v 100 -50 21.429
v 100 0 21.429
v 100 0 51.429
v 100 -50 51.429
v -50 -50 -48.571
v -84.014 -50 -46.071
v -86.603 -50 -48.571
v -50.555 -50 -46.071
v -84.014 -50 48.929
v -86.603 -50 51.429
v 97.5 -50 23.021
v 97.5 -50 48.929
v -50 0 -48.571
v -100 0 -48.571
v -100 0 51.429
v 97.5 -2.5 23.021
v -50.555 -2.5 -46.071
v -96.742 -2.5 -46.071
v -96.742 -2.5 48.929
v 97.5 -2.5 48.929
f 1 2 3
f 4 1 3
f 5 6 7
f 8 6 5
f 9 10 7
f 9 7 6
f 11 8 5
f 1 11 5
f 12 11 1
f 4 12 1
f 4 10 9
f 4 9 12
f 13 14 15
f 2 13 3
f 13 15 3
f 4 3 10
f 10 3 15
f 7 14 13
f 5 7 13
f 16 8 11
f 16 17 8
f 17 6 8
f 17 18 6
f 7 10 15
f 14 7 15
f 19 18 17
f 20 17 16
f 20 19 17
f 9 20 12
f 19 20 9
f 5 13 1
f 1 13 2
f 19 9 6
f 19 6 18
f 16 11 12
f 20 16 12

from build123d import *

# Parameters (mm, degrees)
F1_DEPTH = 50
F3_DEPTH = 100.001
F4_T     = -2.5


with BuildPart() as f1:
    # F0 (on Front) → F1 (new body)
    with BuildSketch(Plane.XZ):
        Polygon((100, 51.4285714286), (-100, 51.4285714286), (-100, -48.5714285714), (-50, -48.5714285714), (100, 21.4285714286), align=None)
    extrude(amount=F1_DEPTH)

    # F2 (on face) → F3 (cut, through all)
    with BuildSketch(Plane.XY.offset(51.4285714286)):
        Polygon((-121.3779896498, -70.3287050128), (-68.4581929454, -117.7156264903), (-86.6025403784, -50), (-100, -50), (-100, 0), (-122.3772391677, 0), align=None)
        Polygon((-100, -50), (-86.6025403784, -50), (-100, 0), align=None)
    extrude(amount=-F3_DEPTH, mode=Mode.SUBTRACT)

    # F4
    f4_openings = [f1.faces().sort_by_distance(p)[0] for p in [
        (-10.253348, -50, 11.868344),
    ]]
    offset(amount=F4_T, openings=f4_openings)


solid = f1.part
